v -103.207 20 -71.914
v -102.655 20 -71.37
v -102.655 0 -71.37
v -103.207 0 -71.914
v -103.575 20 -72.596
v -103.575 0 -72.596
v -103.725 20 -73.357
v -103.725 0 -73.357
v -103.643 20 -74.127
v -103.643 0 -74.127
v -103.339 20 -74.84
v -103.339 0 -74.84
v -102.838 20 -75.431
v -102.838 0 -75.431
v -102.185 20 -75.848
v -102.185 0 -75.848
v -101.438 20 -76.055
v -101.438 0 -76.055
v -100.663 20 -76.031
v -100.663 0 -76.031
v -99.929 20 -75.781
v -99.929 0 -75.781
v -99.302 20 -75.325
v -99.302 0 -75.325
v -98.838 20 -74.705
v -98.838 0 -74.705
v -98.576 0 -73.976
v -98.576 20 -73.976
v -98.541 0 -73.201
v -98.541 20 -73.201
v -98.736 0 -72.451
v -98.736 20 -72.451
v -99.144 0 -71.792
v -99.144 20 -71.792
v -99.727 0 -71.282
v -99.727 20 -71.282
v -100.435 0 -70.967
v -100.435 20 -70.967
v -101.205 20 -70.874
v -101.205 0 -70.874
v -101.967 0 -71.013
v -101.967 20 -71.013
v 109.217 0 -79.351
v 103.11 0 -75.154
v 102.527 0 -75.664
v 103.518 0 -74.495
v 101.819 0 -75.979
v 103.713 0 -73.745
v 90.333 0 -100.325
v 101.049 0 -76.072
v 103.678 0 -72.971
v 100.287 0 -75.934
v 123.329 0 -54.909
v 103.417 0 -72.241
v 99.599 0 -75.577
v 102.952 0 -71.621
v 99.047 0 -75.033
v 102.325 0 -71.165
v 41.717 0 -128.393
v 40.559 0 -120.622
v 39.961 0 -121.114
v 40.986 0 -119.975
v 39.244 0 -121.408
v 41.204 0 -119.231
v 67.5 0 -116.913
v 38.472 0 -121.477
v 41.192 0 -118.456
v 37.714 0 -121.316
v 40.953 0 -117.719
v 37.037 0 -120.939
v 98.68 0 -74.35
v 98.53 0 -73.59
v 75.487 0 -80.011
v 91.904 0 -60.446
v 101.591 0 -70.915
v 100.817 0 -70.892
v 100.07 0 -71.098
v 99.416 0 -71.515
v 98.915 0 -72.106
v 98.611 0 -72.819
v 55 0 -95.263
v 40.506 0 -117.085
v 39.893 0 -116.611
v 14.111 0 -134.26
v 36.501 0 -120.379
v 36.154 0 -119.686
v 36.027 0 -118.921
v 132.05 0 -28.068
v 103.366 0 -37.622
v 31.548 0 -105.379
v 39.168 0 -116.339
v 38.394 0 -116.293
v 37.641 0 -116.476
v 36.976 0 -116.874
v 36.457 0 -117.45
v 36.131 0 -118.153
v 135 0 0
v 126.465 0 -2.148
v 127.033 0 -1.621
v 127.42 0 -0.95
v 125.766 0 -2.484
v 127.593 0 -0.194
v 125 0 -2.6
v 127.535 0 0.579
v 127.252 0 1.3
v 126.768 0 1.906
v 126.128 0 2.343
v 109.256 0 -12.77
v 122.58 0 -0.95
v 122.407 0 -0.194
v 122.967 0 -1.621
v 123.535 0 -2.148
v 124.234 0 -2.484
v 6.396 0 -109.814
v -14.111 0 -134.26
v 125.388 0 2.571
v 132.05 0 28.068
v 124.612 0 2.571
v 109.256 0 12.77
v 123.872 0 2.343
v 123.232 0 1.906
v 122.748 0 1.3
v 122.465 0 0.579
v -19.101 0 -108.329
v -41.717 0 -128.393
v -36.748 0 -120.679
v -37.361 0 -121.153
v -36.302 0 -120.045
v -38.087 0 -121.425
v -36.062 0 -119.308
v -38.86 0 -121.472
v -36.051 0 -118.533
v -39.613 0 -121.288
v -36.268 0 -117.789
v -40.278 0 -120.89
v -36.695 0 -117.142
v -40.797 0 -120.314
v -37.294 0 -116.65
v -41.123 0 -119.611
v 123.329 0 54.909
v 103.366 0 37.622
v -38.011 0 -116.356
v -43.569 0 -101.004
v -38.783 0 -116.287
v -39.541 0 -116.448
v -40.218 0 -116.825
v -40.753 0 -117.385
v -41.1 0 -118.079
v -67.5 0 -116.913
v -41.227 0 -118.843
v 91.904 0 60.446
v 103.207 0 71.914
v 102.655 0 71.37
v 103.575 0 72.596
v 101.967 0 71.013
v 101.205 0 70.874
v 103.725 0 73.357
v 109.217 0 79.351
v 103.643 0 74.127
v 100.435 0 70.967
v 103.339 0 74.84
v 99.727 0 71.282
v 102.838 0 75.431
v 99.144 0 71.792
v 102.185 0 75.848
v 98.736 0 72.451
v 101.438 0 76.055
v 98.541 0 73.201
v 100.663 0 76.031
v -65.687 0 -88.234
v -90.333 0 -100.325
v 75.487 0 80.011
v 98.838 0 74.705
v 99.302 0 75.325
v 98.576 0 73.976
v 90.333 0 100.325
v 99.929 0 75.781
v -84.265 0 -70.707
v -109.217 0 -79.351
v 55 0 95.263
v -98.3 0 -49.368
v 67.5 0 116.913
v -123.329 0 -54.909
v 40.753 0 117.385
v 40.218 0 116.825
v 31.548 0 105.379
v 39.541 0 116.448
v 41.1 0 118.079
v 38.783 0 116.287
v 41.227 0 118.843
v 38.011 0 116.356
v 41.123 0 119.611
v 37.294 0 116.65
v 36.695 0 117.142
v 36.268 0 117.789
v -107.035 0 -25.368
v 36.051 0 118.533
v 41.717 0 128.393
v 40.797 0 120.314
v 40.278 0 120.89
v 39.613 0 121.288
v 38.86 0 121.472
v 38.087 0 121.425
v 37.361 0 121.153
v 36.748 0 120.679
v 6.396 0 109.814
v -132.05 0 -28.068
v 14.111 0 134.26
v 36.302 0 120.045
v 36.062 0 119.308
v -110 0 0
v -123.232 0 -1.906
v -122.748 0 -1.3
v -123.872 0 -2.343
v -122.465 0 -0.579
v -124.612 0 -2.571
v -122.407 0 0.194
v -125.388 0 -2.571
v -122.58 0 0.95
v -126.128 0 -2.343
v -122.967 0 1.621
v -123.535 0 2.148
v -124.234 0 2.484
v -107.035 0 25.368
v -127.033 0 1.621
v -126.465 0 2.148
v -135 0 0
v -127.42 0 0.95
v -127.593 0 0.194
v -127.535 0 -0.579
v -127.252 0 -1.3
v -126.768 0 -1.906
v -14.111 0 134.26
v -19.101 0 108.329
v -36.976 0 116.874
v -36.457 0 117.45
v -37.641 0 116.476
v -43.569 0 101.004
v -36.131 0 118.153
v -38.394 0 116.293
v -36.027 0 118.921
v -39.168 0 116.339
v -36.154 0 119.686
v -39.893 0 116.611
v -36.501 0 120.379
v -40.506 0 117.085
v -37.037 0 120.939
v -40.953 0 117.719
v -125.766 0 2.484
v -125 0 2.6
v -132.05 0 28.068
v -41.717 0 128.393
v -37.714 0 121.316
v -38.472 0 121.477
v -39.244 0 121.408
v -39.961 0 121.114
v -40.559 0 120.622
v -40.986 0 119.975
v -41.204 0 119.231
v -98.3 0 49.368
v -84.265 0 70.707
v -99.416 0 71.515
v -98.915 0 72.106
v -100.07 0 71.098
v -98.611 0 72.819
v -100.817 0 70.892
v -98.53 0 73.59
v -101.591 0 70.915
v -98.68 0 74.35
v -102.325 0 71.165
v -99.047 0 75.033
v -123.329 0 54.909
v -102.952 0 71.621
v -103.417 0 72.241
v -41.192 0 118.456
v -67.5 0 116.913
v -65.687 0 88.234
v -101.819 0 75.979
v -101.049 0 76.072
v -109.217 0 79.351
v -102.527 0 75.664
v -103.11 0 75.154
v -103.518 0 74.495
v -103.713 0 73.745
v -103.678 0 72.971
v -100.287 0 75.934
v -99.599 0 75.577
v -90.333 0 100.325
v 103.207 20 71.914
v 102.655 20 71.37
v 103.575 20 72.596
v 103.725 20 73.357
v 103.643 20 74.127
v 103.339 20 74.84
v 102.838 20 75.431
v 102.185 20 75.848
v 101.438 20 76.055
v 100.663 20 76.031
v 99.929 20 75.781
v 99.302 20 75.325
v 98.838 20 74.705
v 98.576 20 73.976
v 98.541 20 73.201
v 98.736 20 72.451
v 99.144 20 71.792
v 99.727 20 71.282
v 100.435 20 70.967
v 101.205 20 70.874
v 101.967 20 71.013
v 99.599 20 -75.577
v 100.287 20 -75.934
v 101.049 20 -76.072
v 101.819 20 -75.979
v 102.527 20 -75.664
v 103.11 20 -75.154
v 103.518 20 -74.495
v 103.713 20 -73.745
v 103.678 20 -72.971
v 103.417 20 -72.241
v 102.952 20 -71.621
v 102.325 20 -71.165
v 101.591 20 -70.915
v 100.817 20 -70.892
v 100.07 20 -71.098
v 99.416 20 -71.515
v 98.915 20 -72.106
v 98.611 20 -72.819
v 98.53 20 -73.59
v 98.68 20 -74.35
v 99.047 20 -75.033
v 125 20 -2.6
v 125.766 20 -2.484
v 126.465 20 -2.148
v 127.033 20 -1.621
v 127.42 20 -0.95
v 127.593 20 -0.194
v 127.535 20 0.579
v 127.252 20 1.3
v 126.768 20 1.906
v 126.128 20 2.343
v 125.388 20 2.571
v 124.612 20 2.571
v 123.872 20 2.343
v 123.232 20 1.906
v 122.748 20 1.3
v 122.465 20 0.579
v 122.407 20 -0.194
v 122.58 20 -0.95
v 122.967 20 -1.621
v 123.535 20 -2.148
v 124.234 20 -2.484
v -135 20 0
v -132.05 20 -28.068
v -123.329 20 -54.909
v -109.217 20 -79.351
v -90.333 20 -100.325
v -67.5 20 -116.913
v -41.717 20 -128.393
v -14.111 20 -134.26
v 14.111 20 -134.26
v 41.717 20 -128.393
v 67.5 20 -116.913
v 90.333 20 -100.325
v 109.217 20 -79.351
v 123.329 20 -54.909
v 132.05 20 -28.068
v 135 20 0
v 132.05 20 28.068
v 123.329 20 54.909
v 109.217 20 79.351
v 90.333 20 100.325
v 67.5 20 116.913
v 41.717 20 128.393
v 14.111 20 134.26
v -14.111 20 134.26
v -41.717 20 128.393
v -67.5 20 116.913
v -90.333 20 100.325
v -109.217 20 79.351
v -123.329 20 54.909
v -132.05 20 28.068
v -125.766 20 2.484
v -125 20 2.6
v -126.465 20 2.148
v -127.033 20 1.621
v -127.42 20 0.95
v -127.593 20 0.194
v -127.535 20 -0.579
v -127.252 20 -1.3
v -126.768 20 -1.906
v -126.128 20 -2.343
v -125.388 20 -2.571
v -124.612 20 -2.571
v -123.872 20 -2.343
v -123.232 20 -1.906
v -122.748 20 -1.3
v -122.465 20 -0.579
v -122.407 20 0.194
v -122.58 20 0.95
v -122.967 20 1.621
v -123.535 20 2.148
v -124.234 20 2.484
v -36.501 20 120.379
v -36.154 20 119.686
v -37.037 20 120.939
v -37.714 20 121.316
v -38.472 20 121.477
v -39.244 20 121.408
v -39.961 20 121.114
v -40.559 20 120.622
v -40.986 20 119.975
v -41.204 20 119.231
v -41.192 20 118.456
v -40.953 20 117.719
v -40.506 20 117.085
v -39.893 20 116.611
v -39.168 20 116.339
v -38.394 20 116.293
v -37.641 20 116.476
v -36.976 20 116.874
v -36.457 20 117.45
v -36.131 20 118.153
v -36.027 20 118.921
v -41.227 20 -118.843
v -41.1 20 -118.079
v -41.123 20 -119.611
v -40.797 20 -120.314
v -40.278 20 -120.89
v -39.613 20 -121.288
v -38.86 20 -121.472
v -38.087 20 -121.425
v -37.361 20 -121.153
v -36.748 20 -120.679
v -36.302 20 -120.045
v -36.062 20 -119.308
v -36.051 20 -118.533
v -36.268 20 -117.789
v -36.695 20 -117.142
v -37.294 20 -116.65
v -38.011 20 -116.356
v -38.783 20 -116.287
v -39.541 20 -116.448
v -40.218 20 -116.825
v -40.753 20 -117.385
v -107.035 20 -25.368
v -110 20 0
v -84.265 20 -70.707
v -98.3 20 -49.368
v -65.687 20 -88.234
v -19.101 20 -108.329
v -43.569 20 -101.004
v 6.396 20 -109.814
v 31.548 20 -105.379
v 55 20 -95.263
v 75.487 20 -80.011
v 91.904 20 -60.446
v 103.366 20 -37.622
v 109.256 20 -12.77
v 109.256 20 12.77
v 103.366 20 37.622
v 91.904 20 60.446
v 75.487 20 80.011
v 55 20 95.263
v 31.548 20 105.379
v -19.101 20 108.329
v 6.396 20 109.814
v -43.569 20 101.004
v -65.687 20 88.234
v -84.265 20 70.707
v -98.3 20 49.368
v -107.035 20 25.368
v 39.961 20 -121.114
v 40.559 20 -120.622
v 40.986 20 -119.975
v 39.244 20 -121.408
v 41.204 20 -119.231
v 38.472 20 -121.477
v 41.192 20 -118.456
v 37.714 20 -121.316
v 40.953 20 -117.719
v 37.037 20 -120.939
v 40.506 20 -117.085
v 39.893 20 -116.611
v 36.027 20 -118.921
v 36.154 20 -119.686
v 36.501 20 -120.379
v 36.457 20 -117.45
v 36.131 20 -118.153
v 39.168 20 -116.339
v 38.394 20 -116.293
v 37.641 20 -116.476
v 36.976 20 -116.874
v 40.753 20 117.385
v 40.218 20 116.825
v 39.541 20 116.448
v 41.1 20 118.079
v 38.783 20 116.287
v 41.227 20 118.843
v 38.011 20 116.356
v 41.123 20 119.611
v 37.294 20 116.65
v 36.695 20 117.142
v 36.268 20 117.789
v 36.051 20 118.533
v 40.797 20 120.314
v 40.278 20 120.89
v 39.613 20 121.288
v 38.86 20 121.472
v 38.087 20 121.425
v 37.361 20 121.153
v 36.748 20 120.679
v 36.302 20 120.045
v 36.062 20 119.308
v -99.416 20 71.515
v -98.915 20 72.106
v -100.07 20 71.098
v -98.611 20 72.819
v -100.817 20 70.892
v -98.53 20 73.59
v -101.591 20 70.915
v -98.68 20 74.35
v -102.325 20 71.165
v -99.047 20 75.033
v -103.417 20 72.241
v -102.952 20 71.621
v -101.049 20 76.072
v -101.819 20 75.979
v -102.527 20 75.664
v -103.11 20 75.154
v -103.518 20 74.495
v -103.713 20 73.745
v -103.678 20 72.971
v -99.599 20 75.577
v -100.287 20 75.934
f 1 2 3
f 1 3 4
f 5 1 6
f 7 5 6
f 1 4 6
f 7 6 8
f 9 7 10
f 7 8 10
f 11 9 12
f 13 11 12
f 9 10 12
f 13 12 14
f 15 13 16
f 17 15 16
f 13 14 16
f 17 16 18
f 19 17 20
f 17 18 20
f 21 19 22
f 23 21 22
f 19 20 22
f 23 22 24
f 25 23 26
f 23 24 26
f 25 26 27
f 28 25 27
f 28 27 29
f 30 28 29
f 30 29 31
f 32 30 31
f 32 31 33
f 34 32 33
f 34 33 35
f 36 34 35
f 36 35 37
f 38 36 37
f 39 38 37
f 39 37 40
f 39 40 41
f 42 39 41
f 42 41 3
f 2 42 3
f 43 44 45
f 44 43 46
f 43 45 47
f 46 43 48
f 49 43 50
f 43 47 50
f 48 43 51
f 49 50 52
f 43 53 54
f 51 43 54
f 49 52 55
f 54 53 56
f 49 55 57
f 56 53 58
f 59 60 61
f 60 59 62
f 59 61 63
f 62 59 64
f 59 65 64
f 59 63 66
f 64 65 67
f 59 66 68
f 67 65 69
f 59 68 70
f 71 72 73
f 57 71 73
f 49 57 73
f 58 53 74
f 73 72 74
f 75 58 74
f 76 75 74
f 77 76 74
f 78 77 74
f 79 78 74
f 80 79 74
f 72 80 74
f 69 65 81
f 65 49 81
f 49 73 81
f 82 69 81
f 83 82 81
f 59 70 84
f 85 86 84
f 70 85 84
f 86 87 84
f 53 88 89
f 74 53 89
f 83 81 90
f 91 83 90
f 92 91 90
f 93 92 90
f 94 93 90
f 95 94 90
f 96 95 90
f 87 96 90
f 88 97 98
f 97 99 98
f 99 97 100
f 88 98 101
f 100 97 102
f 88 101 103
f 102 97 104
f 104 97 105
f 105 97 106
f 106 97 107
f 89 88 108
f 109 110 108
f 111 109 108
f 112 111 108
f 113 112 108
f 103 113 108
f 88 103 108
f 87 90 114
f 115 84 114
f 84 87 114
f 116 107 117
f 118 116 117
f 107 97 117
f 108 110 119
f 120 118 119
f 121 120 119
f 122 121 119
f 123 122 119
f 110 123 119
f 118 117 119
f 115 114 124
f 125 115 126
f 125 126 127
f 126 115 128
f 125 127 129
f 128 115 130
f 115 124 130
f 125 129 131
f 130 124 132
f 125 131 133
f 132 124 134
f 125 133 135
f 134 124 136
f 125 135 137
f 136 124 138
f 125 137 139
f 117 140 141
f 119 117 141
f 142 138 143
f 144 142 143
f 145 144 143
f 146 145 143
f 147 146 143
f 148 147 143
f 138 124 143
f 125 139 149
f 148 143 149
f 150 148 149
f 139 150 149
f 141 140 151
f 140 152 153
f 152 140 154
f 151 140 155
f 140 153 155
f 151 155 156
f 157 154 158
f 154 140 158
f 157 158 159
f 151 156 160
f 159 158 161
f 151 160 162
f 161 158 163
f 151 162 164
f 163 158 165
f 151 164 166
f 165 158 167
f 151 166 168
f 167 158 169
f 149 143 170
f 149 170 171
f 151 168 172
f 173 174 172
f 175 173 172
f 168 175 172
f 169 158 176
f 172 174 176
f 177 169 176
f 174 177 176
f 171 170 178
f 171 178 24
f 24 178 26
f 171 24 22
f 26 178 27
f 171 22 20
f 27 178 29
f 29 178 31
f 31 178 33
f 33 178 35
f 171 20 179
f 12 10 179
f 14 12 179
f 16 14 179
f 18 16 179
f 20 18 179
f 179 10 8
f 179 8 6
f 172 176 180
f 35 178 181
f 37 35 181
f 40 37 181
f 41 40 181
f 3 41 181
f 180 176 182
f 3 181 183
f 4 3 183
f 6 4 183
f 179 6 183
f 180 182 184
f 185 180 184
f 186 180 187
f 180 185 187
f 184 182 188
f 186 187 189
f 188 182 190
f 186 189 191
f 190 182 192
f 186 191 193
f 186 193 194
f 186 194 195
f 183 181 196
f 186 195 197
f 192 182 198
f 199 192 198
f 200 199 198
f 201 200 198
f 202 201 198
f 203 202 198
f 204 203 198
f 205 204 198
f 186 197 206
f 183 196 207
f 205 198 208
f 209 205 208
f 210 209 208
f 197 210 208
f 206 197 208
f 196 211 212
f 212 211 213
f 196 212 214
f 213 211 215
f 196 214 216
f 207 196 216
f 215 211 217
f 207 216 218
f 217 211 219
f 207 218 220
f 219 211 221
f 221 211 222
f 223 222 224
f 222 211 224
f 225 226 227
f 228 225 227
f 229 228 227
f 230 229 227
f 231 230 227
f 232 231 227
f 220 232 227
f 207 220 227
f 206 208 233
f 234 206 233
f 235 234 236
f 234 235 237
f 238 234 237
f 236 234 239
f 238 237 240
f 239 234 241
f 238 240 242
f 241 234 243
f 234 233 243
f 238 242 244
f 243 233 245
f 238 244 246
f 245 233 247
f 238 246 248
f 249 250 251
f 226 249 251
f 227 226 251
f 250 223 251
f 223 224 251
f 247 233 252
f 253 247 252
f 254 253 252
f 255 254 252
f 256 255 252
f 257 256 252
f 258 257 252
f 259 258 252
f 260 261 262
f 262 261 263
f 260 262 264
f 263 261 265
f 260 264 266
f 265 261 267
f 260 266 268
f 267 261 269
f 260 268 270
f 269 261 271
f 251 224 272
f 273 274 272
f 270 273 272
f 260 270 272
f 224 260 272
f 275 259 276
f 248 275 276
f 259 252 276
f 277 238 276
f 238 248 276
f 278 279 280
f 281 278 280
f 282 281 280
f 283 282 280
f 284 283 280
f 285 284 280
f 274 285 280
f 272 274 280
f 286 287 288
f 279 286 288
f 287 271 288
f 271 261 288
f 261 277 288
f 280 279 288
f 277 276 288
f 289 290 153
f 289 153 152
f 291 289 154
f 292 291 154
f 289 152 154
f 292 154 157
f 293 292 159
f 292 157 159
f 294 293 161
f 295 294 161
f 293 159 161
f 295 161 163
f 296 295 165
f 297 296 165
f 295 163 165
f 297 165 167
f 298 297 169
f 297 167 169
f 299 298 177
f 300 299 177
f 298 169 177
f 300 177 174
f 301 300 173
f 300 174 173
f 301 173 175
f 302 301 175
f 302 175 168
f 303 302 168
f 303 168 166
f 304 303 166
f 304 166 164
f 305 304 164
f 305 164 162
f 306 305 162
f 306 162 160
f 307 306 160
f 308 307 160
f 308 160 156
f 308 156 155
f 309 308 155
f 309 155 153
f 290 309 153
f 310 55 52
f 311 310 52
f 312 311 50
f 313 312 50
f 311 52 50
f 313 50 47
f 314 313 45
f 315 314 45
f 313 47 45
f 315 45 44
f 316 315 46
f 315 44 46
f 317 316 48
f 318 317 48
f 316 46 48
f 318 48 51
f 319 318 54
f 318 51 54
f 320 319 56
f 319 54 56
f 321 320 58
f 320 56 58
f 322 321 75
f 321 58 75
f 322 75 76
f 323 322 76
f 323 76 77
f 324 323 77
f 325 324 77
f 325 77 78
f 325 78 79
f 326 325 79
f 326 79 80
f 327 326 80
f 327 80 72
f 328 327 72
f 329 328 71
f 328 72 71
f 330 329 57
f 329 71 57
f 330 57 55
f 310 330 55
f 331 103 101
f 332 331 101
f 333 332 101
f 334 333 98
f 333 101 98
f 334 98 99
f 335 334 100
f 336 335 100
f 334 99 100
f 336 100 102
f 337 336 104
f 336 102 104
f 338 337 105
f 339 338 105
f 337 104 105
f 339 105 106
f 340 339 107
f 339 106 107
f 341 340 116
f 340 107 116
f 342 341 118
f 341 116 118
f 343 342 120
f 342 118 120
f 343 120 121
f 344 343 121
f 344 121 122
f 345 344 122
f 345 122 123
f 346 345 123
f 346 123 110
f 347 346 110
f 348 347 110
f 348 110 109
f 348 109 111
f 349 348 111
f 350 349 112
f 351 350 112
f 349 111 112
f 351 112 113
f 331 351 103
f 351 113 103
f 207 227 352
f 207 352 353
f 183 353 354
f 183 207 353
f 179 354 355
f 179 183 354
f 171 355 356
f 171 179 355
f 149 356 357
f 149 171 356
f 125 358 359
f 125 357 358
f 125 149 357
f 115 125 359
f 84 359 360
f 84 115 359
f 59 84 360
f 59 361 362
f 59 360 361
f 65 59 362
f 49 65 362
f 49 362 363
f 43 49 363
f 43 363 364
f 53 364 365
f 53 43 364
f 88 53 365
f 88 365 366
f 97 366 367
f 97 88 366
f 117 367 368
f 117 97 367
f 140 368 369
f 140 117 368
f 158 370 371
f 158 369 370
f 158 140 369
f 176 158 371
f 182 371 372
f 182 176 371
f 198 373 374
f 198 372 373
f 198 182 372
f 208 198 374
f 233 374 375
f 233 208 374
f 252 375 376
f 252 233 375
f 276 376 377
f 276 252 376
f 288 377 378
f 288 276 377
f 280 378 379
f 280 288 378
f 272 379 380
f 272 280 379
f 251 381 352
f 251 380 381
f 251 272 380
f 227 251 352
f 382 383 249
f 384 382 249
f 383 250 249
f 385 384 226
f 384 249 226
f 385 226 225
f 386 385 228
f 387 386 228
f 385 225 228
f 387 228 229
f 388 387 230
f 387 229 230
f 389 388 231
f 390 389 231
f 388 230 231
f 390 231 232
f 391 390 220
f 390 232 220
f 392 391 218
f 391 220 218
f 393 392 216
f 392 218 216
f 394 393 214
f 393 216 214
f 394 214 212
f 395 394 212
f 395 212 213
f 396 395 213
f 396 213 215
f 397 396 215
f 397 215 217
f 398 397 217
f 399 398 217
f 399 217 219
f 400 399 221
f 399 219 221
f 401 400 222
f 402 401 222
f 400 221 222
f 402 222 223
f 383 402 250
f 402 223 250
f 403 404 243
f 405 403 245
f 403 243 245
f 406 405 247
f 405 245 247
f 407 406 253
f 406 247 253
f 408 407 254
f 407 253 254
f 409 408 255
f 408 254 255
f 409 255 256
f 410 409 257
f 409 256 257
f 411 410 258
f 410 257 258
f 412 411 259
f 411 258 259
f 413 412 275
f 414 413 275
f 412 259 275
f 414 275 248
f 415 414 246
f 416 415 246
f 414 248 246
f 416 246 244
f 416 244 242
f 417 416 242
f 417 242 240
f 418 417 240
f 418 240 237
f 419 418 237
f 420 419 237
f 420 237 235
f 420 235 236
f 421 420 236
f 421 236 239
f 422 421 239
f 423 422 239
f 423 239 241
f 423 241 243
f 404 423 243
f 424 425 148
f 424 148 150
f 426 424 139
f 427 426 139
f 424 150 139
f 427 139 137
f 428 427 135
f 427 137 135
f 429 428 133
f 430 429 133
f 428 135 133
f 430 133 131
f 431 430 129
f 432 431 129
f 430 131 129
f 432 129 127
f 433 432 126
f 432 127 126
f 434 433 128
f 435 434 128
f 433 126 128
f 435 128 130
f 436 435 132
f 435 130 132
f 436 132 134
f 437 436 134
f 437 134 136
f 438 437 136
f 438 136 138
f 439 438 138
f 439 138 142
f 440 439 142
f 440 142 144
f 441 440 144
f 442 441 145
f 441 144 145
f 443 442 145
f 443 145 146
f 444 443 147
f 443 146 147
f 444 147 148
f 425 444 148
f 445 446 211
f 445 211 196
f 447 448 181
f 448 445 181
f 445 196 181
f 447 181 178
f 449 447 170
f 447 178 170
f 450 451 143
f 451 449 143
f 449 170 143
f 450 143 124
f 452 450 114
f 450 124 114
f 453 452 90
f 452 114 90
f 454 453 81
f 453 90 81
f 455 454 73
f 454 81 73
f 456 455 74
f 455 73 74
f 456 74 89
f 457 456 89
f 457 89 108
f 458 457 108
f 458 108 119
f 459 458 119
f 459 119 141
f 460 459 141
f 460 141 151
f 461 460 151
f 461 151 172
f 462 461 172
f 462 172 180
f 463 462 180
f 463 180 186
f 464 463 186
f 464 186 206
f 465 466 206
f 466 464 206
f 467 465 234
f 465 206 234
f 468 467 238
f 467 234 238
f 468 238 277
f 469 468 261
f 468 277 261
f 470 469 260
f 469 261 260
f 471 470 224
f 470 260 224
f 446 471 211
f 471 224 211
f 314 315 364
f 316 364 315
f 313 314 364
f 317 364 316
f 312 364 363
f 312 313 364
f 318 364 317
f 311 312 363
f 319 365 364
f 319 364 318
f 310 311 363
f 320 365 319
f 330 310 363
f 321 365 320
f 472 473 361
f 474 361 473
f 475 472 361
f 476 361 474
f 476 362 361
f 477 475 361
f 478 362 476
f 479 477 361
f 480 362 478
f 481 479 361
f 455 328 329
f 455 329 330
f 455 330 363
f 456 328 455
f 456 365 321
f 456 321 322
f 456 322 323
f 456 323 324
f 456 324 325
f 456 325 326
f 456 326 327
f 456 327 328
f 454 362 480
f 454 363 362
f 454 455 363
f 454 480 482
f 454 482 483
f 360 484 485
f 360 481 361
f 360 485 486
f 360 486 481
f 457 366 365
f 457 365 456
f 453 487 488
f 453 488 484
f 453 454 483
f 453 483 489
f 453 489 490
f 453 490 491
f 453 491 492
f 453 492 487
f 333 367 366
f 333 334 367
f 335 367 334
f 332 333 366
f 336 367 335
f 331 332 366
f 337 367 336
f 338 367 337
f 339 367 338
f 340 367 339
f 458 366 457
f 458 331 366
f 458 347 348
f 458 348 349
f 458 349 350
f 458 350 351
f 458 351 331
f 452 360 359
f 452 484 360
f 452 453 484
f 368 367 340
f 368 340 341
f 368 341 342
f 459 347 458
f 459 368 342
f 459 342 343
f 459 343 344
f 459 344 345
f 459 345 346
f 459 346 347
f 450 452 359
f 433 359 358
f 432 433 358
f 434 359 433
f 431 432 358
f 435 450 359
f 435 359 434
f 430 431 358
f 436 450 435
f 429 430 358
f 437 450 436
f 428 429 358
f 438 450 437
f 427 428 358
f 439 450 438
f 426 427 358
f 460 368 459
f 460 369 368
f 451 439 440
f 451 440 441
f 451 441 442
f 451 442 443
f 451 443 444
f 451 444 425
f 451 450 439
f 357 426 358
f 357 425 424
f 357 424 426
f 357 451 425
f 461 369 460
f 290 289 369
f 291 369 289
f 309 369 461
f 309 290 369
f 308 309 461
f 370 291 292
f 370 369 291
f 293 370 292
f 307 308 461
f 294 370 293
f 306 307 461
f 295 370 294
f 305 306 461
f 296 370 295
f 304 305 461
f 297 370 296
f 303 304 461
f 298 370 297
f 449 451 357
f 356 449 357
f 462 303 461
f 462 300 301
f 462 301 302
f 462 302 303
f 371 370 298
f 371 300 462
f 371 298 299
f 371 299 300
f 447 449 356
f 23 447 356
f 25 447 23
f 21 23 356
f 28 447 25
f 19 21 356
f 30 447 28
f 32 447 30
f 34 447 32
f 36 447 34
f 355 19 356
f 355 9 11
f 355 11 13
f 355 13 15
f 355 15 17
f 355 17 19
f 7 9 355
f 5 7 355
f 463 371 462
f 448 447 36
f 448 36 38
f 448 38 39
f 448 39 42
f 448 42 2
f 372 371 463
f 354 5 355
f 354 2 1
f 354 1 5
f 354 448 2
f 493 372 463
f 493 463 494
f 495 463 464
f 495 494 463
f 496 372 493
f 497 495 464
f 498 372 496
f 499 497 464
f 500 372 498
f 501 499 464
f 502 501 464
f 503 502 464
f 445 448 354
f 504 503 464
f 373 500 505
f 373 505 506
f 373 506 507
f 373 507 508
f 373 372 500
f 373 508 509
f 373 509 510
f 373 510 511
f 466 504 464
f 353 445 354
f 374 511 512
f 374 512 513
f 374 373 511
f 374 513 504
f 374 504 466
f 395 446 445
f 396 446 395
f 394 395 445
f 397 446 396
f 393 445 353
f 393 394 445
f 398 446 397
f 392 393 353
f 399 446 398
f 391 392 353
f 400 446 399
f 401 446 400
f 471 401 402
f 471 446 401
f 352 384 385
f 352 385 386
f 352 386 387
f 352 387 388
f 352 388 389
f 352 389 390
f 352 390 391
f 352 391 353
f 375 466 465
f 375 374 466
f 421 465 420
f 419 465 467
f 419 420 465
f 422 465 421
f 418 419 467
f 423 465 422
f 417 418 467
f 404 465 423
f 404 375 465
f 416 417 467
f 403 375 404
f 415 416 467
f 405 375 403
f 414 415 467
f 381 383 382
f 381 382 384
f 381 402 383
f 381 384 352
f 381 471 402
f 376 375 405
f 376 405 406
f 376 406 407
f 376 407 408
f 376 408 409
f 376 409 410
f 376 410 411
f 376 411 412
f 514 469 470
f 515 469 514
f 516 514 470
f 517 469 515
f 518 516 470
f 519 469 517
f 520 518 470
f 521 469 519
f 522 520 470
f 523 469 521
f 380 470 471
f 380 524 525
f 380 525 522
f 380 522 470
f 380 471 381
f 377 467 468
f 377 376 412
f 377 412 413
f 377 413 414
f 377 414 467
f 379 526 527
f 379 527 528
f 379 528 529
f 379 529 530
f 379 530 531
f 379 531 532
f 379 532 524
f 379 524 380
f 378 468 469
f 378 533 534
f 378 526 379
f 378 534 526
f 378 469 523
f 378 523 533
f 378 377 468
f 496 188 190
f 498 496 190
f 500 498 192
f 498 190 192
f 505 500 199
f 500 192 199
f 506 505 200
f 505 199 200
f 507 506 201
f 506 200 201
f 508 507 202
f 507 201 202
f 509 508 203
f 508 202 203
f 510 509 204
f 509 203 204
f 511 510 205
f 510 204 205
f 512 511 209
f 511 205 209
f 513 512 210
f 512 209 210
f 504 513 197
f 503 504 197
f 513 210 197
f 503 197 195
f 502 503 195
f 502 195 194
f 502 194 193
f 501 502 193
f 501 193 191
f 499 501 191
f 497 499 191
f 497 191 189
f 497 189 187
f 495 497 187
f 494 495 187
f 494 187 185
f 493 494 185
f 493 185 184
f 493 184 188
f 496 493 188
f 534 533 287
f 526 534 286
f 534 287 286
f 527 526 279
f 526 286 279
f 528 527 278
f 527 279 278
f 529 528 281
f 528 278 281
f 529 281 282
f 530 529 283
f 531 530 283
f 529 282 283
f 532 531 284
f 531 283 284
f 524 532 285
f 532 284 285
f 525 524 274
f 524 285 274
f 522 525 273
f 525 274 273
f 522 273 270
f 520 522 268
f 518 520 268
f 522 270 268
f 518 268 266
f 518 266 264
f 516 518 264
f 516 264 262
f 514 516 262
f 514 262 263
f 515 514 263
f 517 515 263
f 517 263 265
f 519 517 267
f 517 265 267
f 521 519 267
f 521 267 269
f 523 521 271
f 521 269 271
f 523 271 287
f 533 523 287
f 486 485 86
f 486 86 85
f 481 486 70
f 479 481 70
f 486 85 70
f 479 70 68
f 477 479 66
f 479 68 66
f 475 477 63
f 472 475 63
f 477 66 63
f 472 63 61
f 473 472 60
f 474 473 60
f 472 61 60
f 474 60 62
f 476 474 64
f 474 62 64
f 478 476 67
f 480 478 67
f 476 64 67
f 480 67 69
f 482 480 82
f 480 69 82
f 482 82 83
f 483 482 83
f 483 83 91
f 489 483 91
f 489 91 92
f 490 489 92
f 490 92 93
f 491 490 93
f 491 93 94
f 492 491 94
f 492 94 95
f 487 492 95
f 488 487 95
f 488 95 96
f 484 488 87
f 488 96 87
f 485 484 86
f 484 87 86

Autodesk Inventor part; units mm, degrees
ref_plane "YZ Plane" through (0, 0, 0) normal (1, 0, 0) x (0, 1, 0)
ref_plane "XZ Plane" through (0, 0, 0) normal (0, 1, 0) x (-1, 0, 0)
ref_plane "XY Plane" through (0, 0, 0) normal (0, 0, 1) x (1, 0, 0)
sketch "Sketch1" plane through (0, 0, 0) normal (0, 1, 0) x (-1, 0, 0)
  circle A0 centre (0, 0) radius 135
  circle A1 centre (0, 0) radius 110
  dimension "d0" = 270
  dimension "d1" = 220
extrude "Extrusion1" add sketch "Sketch1" along normal blind 20
sketch "Sketch2" plane through (0, 20, 0) normal (0, 1, 0) x (1, 0, 0)
  line L0 (-189, 0) -> (189, 0) projected
  point P0 (0, 0)
  point P1 (-125, 0)
  dimension "d11" = 125
hole "Hole1" at (-125, 20, 0) direction (0, -1, 0) diameter 5.2 end through all
pattern_circular "Circular Pattern1" count 10 over 360 about axis through (0, -10, 0) along (0, 1, 0) of "Hole1"
properties part number "Lower Ring (30mm)"
